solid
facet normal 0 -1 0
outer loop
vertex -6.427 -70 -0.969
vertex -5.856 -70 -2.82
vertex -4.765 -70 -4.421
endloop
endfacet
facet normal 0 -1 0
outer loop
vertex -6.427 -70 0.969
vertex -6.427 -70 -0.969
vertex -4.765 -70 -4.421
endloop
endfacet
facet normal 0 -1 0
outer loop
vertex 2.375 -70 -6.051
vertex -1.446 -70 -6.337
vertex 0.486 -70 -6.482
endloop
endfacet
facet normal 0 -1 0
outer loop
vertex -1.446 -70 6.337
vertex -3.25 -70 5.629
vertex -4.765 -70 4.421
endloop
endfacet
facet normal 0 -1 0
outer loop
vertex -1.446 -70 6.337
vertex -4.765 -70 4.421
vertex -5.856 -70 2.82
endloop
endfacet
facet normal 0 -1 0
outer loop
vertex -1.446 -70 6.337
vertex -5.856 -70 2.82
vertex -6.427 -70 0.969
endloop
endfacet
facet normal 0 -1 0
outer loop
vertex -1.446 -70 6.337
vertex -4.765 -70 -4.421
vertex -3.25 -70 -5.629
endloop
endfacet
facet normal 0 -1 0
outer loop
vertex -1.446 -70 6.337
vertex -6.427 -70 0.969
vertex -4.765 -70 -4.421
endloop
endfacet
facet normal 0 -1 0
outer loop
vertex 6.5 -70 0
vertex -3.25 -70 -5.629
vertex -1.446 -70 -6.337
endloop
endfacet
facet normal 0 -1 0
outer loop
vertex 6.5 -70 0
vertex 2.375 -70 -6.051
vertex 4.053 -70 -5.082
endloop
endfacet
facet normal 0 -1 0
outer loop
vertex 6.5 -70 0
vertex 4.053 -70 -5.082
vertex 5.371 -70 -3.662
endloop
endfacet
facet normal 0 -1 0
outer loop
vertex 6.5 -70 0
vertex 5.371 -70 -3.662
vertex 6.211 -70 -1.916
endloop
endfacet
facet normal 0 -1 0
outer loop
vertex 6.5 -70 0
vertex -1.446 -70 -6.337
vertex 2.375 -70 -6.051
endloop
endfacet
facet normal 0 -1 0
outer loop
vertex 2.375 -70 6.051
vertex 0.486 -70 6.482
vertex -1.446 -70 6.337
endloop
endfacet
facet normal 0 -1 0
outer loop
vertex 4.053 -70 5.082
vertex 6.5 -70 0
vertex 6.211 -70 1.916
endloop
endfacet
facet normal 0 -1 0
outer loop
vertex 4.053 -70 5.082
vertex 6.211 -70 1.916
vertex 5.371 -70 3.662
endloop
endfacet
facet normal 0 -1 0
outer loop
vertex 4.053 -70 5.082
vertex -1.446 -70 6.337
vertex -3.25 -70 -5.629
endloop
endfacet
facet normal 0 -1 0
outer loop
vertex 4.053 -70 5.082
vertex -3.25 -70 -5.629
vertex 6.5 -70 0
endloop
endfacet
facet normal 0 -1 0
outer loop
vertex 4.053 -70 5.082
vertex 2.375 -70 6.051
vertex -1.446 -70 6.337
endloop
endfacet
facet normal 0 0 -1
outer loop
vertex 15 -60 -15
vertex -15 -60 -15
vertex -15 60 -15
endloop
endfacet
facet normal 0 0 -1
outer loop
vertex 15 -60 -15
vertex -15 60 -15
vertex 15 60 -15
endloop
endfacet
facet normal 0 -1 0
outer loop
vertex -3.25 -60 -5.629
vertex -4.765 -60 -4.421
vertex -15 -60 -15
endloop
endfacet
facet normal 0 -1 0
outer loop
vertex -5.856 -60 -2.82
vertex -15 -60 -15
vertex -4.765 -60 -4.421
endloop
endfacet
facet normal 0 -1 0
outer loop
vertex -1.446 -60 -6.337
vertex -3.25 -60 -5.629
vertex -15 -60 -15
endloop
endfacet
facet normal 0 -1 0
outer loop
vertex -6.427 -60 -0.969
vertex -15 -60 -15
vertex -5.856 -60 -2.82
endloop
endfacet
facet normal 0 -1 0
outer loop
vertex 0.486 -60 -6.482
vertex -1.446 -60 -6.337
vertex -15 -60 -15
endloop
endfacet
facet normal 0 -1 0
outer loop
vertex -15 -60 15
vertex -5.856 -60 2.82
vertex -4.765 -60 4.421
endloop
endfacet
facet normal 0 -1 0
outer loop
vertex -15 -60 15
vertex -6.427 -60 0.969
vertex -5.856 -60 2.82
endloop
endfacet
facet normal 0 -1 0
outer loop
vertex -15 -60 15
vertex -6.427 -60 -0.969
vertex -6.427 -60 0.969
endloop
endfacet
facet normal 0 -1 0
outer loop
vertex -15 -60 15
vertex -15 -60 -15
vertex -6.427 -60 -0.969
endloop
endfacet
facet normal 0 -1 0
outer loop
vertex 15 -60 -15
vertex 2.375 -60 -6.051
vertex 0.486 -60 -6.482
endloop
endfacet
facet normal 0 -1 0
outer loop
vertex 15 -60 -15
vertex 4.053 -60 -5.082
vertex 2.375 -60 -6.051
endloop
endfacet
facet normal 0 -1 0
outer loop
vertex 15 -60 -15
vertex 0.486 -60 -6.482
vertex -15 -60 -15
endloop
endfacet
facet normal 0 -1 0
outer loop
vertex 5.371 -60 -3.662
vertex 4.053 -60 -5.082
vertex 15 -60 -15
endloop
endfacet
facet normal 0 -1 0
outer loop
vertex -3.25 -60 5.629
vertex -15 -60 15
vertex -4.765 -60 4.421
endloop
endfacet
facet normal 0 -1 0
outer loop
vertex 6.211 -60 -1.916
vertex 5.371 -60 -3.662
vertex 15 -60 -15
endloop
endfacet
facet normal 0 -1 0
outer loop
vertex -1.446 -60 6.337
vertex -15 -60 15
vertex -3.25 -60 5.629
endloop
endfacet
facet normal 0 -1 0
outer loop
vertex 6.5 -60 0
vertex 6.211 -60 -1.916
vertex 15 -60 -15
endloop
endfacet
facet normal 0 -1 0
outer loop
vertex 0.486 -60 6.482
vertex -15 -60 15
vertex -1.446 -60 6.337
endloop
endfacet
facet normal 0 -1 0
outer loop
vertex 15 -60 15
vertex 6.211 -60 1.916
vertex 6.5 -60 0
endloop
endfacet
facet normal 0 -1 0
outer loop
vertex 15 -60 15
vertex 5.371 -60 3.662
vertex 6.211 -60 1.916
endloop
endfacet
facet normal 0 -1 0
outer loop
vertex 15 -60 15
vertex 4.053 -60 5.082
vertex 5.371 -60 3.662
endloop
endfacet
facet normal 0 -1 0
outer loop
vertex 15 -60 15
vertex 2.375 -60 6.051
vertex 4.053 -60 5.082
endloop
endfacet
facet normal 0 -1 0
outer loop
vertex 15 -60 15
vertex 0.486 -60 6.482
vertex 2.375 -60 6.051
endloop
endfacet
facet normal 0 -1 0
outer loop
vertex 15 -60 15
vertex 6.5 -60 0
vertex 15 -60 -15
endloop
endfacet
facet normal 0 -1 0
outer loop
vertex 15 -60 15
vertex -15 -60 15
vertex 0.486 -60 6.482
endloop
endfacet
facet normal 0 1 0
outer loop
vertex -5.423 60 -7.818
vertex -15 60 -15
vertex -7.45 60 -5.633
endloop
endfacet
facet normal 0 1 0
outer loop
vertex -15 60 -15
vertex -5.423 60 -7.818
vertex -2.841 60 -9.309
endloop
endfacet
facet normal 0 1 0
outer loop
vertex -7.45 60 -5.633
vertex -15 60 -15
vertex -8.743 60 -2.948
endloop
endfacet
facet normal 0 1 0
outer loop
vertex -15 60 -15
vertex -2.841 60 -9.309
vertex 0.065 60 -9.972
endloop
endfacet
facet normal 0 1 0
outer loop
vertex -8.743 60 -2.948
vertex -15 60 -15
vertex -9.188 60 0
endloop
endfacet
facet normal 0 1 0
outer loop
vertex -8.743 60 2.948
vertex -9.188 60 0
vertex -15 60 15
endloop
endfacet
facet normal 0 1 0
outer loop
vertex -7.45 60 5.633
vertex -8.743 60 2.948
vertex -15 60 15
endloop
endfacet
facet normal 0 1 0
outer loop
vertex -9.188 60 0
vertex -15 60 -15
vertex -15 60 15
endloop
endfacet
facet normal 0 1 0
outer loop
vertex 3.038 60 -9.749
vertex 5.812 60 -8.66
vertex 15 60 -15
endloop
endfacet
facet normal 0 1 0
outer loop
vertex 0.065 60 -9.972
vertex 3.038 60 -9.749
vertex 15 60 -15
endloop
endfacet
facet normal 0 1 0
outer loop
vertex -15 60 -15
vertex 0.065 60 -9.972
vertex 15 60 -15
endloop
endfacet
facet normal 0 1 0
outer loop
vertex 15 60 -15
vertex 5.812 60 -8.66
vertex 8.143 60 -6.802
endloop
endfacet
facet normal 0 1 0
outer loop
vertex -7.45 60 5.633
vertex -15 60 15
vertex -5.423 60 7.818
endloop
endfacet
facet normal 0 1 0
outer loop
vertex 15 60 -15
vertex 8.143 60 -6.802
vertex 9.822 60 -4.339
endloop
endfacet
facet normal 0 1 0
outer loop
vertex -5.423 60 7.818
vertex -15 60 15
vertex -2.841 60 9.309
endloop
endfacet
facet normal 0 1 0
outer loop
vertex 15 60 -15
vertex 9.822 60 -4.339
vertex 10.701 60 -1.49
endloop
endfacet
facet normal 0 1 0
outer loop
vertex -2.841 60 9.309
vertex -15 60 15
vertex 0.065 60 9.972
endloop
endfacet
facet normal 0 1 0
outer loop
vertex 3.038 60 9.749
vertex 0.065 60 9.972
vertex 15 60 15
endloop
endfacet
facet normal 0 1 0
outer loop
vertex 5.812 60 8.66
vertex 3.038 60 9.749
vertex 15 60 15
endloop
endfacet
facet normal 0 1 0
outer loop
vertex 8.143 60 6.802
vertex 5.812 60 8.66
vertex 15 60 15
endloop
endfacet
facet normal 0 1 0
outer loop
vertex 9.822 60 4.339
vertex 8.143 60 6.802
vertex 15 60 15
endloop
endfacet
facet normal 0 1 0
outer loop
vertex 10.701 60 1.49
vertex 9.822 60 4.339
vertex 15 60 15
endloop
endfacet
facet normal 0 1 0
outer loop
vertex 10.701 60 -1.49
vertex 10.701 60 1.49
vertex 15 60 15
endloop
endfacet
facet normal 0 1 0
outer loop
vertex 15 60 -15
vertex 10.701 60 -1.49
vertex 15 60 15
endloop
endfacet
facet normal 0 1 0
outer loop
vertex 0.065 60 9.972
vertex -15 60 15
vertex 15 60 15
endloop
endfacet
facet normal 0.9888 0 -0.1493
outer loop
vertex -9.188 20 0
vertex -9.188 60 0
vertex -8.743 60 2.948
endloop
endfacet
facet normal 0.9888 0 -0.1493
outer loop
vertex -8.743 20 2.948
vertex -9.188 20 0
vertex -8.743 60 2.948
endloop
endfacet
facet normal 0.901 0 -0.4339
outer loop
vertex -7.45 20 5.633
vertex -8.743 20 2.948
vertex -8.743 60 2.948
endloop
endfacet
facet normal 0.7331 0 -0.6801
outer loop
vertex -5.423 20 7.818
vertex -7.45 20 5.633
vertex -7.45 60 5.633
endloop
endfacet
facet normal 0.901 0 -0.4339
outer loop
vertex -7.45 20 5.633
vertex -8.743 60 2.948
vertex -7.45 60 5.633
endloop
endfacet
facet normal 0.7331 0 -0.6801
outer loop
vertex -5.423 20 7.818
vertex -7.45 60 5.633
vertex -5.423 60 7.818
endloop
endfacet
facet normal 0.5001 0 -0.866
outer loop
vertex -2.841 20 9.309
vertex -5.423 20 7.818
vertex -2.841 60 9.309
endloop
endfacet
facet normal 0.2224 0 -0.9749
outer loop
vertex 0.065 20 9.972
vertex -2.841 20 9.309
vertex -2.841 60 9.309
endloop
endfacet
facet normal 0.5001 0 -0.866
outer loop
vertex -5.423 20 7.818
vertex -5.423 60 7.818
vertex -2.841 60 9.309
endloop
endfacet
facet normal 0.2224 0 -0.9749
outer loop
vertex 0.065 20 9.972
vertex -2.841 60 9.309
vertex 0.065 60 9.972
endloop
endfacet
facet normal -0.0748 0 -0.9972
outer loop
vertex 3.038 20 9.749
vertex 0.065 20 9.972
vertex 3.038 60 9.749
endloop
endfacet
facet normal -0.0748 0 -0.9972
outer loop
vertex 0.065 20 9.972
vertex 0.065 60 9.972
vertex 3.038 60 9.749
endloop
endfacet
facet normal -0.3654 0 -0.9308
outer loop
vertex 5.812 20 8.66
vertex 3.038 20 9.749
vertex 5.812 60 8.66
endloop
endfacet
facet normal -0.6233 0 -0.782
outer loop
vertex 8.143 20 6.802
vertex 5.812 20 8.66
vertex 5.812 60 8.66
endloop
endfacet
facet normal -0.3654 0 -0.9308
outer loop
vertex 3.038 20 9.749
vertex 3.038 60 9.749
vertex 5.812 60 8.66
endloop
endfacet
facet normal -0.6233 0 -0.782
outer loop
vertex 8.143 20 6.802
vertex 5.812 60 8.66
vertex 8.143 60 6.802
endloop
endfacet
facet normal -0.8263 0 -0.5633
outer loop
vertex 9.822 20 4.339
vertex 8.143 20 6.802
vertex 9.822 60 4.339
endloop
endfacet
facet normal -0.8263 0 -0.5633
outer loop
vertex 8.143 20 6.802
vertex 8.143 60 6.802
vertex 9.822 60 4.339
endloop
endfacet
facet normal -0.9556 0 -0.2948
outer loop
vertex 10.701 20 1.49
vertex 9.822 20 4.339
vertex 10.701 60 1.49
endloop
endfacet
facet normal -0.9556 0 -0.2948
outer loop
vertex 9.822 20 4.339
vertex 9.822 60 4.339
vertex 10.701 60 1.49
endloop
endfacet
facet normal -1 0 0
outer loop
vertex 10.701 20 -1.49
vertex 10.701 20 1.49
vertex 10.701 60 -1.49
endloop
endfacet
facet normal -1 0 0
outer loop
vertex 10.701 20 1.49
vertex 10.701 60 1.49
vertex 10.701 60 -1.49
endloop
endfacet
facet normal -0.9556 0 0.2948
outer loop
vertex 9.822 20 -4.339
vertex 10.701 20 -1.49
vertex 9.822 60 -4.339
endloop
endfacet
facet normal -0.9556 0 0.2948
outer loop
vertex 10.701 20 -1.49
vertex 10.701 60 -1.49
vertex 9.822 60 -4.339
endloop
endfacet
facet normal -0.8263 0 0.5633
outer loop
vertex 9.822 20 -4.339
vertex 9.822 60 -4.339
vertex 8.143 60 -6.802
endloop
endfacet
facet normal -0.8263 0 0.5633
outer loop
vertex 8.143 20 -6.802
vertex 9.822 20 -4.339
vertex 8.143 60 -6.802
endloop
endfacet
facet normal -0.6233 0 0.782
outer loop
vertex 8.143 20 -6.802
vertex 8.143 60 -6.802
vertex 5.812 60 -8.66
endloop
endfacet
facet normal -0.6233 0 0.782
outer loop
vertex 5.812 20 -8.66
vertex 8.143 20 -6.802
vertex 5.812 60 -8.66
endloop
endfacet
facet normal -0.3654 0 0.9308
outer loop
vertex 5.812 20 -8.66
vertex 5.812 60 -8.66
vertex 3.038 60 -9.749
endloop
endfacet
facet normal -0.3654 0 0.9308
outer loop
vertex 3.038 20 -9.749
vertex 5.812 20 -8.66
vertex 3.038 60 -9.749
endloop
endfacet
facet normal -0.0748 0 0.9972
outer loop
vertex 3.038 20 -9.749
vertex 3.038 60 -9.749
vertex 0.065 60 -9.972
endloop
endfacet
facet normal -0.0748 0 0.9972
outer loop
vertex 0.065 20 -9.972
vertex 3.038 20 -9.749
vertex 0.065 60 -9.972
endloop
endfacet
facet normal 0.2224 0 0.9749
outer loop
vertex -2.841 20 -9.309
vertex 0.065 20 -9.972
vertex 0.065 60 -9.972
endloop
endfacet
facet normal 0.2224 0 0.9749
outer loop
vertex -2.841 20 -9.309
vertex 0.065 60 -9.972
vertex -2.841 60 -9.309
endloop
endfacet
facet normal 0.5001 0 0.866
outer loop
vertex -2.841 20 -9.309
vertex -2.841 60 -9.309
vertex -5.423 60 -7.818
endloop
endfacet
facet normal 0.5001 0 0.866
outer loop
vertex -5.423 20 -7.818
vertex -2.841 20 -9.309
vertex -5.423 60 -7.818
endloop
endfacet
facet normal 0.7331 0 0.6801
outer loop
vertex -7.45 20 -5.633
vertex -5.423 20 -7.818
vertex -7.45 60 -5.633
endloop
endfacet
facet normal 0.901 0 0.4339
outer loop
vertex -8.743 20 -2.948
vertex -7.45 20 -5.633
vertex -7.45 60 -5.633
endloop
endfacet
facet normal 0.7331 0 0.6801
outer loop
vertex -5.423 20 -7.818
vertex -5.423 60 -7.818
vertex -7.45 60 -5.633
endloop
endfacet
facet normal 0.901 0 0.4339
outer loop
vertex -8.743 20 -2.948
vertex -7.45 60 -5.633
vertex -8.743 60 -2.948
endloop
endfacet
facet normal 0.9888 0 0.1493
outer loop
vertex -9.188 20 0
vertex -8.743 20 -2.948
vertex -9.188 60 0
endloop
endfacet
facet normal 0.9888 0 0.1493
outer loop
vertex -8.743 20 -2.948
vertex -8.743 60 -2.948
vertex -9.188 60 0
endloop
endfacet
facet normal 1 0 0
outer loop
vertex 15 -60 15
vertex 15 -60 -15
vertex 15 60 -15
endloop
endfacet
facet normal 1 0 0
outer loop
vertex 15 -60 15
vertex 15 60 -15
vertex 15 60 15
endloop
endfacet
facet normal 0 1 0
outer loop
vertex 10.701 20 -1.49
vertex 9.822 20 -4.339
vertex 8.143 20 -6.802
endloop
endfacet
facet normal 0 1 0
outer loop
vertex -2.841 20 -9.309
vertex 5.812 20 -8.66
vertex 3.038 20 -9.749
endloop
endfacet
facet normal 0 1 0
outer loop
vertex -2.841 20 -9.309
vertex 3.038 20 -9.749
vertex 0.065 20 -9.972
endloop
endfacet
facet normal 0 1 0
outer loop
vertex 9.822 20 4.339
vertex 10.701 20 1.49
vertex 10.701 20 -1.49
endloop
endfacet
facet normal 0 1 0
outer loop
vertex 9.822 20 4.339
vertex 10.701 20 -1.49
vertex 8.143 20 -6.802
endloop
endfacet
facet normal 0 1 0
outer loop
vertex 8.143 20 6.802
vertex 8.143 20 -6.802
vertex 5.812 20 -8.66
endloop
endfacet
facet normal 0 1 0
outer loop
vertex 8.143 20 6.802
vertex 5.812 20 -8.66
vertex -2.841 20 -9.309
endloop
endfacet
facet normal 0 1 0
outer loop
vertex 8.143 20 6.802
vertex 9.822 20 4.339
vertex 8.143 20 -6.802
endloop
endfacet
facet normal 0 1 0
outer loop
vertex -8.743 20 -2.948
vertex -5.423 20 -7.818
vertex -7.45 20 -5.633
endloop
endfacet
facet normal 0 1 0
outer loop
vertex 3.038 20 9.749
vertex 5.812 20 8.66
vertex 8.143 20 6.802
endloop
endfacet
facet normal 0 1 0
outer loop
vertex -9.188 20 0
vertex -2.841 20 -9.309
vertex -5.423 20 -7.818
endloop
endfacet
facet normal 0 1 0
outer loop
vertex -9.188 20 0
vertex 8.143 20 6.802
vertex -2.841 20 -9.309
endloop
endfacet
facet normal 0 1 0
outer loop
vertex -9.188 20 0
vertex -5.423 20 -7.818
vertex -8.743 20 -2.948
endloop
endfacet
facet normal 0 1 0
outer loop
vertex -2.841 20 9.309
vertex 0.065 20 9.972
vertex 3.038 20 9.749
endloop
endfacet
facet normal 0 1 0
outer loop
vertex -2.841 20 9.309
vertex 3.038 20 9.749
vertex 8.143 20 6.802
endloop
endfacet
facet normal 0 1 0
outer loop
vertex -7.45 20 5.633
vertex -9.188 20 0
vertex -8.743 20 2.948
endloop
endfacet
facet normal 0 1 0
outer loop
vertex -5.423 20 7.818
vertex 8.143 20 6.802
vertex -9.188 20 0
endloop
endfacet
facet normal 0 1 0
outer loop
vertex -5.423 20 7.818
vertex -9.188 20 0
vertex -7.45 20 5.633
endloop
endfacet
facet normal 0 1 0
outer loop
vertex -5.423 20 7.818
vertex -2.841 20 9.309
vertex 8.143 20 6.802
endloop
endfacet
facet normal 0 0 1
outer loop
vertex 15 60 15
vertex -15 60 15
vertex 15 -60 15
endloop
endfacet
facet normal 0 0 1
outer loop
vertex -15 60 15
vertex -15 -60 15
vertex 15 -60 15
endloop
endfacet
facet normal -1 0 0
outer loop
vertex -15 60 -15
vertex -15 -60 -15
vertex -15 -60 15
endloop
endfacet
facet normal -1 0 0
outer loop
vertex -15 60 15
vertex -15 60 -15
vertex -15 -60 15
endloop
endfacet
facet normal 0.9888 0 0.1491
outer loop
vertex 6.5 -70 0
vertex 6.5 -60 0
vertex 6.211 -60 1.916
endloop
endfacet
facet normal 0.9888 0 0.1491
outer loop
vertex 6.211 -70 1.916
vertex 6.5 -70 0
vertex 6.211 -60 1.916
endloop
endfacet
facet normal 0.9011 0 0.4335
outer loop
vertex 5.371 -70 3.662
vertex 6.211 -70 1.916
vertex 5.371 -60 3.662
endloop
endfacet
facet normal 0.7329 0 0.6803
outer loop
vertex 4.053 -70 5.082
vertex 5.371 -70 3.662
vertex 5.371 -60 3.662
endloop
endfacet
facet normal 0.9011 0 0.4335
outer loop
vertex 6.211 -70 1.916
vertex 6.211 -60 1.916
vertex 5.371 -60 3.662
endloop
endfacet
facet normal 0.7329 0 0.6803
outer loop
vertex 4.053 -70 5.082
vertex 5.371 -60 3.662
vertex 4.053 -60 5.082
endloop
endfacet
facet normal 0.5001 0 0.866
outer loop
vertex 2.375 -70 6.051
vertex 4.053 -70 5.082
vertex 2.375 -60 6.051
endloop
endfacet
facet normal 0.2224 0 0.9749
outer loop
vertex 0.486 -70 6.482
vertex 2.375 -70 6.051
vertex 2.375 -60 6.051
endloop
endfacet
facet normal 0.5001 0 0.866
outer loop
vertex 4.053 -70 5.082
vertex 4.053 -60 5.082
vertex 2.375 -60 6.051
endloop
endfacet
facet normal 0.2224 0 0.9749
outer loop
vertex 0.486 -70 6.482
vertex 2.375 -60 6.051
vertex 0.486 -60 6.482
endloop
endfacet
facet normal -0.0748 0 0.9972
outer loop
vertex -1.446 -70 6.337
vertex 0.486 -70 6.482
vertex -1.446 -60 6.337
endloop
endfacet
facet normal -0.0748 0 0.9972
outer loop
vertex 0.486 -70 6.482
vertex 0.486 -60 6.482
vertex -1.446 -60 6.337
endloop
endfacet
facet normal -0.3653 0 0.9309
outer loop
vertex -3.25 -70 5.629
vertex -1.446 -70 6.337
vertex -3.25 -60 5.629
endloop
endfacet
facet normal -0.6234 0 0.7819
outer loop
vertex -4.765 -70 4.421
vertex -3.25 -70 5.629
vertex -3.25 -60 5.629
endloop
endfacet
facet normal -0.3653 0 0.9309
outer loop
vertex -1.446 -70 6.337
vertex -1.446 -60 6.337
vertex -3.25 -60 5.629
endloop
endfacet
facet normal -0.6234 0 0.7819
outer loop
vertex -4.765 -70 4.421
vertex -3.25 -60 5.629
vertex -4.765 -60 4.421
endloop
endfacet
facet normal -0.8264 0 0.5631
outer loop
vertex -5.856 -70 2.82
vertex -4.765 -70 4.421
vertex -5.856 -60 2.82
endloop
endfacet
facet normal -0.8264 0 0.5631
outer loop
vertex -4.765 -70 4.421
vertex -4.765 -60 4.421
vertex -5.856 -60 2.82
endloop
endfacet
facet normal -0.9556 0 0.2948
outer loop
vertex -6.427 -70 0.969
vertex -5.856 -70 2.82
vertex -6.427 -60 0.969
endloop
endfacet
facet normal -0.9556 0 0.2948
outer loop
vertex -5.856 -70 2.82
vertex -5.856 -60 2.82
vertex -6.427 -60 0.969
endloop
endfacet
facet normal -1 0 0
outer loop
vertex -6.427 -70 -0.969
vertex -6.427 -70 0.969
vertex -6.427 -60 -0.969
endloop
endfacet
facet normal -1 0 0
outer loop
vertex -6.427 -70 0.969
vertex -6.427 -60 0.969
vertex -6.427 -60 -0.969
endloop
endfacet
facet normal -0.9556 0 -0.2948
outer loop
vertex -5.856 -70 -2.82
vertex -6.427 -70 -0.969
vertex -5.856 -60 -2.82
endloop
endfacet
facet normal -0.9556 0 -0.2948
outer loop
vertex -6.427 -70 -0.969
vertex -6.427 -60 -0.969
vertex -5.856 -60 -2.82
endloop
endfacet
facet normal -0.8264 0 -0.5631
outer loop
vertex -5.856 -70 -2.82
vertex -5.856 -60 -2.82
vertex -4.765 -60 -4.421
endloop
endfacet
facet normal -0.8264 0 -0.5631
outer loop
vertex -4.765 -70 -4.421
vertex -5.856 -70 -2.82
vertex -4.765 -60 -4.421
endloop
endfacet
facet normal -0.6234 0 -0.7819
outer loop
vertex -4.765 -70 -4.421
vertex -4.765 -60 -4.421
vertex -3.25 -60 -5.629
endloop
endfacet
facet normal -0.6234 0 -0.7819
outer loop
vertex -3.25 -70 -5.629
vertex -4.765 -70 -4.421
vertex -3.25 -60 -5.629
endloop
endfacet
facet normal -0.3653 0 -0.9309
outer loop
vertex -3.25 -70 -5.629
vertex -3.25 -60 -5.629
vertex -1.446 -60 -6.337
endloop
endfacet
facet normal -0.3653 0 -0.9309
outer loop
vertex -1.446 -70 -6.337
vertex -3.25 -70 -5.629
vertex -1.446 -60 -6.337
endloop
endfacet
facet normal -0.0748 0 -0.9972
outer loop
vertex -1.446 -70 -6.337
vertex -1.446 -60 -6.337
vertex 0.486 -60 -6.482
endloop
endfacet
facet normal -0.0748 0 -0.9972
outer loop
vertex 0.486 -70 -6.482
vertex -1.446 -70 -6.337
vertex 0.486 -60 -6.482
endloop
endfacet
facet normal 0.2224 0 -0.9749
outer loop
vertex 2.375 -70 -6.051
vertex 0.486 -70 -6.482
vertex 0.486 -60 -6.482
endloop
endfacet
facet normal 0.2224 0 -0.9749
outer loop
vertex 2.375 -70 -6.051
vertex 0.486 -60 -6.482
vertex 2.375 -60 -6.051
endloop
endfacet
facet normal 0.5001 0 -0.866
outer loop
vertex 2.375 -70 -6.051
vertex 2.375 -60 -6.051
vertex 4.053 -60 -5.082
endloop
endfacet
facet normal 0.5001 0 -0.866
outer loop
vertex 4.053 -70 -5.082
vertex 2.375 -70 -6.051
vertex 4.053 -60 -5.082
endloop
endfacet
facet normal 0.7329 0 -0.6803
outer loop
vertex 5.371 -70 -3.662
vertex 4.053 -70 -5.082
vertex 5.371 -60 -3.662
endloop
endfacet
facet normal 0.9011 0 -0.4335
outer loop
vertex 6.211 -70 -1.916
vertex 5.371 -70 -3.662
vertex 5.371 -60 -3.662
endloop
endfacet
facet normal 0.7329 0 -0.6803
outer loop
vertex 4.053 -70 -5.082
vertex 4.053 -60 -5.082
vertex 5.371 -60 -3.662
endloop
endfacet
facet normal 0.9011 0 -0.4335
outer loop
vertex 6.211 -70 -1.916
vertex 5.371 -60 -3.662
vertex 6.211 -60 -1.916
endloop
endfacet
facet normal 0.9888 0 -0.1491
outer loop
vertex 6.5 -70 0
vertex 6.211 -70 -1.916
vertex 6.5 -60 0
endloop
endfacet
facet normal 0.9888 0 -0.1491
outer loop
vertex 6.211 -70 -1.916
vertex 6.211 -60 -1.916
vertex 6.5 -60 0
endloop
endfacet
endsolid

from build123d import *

# Parameters (mm, degrees)
F0_W     = 30
F0_H     = 30
F1_DEPTH = 60
F2_R     = 6.5
F3_DEPTH = 10
F4_R     = 10
F5_DEPTH = 40


with BuildPart() as f1:
    # F0 (on Front) → F1 (new body, symmetric)
    with BuildSketch(Plane.XZ):
        Rectangle(F0_W, F0_H)
    extrude(amount=F1_DEPTH, both=True)

    # F2 (on face) → F3 (join)
    with BuildSketch(Plane.XZ.offset(60)):
        Circle(F2_R)
    extrude(amount=F3_DEPTH)

    # F4 (on face) → F5 (cut)
    with BuildSketch(Plane(origin=(0, 60, 0), x_dir=(-1, 0, 0), z_dir=(0, 1, 0))):
        with Locations((-0.812379, 0)):
            Circle(F4_R)
    extrude(amount=-F5_DEPTH, mode=Mode.SUBTRACT)


solid = f1.part
